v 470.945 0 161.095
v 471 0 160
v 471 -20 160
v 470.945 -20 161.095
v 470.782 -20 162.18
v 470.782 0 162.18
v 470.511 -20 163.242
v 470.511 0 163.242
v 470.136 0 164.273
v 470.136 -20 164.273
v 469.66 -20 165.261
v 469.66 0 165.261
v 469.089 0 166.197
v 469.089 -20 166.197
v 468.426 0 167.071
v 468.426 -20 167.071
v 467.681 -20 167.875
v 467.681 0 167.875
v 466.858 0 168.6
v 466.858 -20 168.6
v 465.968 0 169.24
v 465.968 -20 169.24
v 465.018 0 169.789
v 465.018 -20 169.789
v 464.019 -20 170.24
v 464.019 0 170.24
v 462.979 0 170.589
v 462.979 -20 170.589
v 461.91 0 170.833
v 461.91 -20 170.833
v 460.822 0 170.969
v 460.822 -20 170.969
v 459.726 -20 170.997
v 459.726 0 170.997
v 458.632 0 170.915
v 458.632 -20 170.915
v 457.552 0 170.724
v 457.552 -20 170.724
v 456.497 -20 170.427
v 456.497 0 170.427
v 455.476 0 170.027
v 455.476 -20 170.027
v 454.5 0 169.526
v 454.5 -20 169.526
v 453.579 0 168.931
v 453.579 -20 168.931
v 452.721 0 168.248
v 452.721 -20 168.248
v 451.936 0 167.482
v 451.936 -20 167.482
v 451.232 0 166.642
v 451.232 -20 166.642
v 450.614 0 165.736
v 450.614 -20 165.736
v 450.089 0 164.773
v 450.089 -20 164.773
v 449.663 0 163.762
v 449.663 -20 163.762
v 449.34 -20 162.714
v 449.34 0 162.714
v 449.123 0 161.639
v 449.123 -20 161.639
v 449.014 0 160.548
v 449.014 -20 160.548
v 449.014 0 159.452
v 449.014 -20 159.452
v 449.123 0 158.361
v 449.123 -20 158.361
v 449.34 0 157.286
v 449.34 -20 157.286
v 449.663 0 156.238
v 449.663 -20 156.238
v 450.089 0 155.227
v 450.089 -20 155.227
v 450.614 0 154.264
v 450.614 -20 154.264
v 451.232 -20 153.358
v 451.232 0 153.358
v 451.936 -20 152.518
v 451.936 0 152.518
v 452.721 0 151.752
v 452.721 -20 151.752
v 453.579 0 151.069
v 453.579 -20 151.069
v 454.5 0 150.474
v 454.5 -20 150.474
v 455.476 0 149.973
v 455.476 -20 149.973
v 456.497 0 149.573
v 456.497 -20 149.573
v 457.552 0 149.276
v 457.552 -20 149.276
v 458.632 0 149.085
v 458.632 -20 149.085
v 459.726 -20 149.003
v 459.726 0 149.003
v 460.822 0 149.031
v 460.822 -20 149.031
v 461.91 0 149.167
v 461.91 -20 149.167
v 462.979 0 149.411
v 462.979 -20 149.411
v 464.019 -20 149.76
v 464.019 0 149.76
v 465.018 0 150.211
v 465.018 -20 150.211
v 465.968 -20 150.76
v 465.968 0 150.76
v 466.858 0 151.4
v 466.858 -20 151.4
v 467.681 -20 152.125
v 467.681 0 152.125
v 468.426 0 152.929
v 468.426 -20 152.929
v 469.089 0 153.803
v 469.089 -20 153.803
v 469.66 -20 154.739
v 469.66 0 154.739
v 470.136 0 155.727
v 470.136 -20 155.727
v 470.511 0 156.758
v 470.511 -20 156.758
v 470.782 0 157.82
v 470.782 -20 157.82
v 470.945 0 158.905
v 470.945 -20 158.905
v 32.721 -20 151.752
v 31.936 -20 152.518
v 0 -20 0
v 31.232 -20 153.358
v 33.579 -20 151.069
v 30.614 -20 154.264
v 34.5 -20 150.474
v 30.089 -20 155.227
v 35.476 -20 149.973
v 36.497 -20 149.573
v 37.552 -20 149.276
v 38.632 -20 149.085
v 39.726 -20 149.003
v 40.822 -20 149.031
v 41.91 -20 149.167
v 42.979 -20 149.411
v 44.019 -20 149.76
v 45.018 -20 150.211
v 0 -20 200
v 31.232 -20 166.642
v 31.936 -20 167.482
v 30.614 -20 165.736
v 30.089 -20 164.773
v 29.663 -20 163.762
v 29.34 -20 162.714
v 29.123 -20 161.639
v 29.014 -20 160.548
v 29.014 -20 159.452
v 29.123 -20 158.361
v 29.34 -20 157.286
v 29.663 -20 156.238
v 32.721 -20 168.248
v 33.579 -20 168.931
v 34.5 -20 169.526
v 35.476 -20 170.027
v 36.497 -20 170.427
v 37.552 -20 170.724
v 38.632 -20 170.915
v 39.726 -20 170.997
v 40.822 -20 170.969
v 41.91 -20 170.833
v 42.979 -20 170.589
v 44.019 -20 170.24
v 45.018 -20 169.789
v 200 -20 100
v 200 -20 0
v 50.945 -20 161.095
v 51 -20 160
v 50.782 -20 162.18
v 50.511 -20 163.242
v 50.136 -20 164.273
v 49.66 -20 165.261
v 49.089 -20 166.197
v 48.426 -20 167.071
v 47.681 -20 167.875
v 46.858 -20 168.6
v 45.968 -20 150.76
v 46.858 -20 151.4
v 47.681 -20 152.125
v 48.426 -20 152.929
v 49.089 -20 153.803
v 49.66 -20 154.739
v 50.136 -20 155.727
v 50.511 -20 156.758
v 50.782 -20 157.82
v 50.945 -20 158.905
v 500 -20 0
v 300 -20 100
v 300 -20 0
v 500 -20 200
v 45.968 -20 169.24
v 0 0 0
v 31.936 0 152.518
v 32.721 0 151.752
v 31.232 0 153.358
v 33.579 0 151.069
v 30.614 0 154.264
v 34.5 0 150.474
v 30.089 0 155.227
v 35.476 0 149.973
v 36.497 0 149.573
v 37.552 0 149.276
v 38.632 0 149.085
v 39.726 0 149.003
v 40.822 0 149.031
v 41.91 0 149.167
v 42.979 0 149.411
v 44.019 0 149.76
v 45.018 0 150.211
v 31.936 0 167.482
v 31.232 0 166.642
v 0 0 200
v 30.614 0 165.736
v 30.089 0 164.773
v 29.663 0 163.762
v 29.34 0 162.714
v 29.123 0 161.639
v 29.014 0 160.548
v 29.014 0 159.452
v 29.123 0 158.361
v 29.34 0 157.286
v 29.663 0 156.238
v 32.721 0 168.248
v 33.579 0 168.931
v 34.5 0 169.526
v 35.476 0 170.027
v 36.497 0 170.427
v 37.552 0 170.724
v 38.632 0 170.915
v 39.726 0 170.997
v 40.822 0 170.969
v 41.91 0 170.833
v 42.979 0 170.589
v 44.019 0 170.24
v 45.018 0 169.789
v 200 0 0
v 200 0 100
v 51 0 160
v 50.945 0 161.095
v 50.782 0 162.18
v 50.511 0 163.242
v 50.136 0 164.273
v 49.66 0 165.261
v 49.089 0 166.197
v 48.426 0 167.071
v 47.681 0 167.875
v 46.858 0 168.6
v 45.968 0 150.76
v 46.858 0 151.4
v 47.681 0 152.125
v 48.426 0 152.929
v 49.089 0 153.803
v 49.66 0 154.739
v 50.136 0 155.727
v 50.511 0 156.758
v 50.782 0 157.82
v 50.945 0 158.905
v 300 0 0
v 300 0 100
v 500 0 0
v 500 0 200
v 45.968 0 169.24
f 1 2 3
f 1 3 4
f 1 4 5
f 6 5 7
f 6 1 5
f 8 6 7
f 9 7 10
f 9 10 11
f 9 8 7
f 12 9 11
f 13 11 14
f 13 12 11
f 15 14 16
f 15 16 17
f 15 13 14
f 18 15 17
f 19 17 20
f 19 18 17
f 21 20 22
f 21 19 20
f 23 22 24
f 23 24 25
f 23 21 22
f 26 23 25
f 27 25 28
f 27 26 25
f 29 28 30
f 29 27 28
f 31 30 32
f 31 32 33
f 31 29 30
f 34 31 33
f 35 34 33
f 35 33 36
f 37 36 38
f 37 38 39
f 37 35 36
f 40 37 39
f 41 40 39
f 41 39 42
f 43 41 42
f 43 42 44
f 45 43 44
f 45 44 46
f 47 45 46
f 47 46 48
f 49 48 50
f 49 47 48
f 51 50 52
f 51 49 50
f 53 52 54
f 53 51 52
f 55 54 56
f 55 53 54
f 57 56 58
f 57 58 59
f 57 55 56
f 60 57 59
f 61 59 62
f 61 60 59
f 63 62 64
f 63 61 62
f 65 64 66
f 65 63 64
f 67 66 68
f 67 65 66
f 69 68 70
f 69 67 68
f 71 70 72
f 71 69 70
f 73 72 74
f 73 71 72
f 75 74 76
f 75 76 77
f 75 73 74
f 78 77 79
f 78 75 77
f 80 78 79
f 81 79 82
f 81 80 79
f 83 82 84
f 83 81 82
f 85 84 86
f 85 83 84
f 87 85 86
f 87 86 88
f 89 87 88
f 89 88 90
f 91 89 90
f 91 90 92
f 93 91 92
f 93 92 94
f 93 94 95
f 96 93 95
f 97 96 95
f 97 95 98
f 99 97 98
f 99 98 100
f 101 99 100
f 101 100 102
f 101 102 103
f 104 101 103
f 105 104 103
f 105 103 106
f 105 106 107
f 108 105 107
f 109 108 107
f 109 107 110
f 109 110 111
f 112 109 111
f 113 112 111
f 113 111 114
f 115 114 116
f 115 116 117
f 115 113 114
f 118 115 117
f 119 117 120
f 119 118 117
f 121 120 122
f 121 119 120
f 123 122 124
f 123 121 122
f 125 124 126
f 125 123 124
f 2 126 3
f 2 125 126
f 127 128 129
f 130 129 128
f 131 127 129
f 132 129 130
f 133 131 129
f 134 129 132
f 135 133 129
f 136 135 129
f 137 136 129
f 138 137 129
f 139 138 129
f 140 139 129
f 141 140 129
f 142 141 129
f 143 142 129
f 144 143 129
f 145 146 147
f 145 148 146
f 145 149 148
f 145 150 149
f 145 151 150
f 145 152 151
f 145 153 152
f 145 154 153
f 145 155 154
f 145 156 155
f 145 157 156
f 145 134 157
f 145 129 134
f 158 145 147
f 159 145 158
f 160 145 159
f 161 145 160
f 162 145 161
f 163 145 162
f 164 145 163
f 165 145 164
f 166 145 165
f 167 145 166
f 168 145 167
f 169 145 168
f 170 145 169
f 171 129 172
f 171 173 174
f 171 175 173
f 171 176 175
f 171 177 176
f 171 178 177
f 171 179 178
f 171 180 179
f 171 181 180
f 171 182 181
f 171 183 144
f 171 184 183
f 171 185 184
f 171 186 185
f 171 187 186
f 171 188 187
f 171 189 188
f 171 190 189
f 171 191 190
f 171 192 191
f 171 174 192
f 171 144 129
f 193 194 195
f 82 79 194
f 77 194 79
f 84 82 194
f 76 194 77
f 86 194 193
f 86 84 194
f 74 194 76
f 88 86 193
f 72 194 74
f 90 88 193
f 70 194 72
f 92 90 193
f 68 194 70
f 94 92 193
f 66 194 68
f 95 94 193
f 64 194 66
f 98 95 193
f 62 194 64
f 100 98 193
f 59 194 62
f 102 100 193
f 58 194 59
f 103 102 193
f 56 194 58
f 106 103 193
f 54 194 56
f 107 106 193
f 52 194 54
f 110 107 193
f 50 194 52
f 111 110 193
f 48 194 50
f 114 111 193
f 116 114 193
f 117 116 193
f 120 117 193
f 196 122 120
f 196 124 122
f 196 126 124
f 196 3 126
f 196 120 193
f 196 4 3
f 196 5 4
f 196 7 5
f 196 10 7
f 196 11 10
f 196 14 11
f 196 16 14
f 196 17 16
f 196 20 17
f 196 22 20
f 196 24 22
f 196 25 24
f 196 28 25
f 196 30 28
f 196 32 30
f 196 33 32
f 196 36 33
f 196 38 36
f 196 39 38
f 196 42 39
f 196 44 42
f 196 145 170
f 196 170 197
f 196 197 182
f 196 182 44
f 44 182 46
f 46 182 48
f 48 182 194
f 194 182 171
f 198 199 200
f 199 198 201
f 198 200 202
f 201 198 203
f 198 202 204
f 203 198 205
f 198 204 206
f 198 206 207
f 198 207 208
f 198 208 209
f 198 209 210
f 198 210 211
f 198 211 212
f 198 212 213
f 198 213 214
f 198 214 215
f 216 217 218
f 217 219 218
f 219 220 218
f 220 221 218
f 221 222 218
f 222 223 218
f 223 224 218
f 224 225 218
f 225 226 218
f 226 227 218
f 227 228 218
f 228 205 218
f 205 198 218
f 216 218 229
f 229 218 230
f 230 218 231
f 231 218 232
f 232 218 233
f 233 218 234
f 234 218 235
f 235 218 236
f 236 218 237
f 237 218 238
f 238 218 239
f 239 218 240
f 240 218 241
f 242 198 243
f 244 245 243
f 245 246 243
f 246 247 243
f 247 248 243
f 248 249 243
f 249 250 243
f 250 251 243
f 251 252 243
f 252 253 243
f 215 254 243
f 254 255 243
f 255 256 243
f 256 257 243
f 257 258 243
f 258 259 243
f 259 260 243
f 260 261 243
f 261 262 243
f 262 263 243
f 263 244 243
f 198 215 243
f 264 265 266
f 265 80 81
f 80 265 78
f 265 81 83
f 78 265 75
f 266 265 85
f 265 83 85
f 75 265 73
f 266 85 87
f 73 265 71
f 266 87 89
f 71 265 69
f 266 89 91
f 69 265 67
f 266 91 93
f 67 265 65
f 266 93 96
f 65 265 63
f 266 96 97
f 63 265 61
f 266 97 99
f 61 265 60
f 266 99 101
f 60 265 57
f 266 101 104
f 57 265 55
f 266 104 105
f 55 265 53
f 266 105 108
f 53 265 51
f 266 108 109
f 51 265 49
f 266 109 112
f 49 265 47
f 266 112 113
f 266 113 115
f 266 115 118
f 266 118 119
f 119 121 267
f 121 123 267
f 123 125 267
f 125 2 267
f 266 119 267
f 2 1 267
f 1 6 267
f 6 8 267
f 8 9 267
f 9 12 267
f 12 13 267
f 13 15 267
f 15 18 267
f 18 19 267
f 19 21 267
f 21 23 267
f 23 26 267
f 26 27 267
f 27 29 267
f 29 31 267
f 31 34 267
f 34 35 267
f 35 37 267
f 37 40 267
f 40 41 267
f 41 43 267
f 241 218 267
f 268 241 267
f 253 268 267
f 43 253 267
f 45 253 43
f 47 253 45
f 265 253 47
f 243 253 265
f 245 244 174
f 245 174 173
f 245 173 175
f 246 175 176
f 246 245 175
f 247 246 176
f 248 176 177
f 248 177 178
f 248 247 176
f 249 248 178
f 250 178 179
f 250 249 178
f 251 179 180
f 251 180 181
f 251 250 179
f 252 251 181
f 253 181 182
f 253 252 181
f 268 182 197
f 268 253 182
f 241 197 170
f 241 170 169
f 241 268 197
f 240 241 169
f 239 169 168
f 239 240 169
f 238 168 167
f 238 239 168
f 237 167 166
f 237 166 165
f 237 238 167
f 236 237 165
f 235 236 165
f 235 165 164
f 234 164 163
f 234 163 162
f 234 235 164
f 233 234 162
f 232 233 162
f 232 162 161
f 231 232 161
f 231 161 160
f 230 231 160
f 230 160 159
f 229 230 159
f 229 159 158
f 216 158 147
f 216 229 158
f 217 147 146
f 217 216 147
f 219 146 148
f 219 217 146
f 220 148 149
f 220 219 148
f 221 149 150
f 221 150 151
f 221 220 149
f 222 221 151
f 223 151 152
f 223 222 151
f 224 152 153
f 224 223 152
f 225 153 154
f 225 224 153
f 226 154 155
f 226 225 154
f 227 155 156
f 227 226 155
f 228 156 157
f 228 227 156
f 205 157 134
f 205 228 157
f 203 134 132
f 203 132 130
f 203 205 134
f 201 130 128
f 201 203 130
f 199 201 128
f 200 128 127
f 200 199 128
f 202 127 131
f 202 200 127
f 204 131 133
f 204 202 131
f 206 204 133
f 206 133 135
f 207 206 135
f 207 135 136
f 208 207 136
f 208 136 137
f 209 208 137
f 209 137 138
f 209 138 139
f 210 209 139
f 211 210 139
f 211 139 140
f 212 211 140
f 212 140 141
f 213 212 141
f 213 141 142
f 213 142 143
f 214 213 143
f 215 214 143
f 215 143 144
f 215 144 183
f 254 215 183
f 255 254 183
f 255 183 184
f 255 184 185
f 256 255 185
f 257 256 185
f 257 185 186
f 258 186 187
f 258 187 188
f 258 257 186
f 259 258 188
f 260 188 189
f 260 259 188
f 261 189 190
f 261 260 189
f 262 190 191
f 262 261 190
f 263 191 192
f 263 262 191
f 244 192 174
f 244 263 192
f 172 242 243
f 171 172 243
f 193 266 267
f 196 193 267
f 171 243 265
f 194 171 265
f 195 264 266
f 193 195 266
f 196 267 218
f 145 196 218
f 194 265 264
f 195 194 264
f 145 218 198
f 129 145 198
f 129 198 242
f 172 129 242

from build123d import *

# Parameters (mm, degrees)
F0_R     = 11
F1_DEPTH = 20


with BuildPart() as f1:
    # F0 (on Front) → F1 (new body)
    with BuildSketch(Plane.XZ):
        Polygon((0, 200), (0, 0), (200, 0), (200, 100), (300, 100), (300, 0), (500, 0), (500, 200), align=None)
        with Locations((40, 160)):
            Circle(F0_R, mode=Mode.SUBTRACT)
        with Locations((460, 160)):
            Circle(F0_R, mode=Mode.SUBTRACT)
    extrude(amount=F1_DEPTH)


solid = f1.part
